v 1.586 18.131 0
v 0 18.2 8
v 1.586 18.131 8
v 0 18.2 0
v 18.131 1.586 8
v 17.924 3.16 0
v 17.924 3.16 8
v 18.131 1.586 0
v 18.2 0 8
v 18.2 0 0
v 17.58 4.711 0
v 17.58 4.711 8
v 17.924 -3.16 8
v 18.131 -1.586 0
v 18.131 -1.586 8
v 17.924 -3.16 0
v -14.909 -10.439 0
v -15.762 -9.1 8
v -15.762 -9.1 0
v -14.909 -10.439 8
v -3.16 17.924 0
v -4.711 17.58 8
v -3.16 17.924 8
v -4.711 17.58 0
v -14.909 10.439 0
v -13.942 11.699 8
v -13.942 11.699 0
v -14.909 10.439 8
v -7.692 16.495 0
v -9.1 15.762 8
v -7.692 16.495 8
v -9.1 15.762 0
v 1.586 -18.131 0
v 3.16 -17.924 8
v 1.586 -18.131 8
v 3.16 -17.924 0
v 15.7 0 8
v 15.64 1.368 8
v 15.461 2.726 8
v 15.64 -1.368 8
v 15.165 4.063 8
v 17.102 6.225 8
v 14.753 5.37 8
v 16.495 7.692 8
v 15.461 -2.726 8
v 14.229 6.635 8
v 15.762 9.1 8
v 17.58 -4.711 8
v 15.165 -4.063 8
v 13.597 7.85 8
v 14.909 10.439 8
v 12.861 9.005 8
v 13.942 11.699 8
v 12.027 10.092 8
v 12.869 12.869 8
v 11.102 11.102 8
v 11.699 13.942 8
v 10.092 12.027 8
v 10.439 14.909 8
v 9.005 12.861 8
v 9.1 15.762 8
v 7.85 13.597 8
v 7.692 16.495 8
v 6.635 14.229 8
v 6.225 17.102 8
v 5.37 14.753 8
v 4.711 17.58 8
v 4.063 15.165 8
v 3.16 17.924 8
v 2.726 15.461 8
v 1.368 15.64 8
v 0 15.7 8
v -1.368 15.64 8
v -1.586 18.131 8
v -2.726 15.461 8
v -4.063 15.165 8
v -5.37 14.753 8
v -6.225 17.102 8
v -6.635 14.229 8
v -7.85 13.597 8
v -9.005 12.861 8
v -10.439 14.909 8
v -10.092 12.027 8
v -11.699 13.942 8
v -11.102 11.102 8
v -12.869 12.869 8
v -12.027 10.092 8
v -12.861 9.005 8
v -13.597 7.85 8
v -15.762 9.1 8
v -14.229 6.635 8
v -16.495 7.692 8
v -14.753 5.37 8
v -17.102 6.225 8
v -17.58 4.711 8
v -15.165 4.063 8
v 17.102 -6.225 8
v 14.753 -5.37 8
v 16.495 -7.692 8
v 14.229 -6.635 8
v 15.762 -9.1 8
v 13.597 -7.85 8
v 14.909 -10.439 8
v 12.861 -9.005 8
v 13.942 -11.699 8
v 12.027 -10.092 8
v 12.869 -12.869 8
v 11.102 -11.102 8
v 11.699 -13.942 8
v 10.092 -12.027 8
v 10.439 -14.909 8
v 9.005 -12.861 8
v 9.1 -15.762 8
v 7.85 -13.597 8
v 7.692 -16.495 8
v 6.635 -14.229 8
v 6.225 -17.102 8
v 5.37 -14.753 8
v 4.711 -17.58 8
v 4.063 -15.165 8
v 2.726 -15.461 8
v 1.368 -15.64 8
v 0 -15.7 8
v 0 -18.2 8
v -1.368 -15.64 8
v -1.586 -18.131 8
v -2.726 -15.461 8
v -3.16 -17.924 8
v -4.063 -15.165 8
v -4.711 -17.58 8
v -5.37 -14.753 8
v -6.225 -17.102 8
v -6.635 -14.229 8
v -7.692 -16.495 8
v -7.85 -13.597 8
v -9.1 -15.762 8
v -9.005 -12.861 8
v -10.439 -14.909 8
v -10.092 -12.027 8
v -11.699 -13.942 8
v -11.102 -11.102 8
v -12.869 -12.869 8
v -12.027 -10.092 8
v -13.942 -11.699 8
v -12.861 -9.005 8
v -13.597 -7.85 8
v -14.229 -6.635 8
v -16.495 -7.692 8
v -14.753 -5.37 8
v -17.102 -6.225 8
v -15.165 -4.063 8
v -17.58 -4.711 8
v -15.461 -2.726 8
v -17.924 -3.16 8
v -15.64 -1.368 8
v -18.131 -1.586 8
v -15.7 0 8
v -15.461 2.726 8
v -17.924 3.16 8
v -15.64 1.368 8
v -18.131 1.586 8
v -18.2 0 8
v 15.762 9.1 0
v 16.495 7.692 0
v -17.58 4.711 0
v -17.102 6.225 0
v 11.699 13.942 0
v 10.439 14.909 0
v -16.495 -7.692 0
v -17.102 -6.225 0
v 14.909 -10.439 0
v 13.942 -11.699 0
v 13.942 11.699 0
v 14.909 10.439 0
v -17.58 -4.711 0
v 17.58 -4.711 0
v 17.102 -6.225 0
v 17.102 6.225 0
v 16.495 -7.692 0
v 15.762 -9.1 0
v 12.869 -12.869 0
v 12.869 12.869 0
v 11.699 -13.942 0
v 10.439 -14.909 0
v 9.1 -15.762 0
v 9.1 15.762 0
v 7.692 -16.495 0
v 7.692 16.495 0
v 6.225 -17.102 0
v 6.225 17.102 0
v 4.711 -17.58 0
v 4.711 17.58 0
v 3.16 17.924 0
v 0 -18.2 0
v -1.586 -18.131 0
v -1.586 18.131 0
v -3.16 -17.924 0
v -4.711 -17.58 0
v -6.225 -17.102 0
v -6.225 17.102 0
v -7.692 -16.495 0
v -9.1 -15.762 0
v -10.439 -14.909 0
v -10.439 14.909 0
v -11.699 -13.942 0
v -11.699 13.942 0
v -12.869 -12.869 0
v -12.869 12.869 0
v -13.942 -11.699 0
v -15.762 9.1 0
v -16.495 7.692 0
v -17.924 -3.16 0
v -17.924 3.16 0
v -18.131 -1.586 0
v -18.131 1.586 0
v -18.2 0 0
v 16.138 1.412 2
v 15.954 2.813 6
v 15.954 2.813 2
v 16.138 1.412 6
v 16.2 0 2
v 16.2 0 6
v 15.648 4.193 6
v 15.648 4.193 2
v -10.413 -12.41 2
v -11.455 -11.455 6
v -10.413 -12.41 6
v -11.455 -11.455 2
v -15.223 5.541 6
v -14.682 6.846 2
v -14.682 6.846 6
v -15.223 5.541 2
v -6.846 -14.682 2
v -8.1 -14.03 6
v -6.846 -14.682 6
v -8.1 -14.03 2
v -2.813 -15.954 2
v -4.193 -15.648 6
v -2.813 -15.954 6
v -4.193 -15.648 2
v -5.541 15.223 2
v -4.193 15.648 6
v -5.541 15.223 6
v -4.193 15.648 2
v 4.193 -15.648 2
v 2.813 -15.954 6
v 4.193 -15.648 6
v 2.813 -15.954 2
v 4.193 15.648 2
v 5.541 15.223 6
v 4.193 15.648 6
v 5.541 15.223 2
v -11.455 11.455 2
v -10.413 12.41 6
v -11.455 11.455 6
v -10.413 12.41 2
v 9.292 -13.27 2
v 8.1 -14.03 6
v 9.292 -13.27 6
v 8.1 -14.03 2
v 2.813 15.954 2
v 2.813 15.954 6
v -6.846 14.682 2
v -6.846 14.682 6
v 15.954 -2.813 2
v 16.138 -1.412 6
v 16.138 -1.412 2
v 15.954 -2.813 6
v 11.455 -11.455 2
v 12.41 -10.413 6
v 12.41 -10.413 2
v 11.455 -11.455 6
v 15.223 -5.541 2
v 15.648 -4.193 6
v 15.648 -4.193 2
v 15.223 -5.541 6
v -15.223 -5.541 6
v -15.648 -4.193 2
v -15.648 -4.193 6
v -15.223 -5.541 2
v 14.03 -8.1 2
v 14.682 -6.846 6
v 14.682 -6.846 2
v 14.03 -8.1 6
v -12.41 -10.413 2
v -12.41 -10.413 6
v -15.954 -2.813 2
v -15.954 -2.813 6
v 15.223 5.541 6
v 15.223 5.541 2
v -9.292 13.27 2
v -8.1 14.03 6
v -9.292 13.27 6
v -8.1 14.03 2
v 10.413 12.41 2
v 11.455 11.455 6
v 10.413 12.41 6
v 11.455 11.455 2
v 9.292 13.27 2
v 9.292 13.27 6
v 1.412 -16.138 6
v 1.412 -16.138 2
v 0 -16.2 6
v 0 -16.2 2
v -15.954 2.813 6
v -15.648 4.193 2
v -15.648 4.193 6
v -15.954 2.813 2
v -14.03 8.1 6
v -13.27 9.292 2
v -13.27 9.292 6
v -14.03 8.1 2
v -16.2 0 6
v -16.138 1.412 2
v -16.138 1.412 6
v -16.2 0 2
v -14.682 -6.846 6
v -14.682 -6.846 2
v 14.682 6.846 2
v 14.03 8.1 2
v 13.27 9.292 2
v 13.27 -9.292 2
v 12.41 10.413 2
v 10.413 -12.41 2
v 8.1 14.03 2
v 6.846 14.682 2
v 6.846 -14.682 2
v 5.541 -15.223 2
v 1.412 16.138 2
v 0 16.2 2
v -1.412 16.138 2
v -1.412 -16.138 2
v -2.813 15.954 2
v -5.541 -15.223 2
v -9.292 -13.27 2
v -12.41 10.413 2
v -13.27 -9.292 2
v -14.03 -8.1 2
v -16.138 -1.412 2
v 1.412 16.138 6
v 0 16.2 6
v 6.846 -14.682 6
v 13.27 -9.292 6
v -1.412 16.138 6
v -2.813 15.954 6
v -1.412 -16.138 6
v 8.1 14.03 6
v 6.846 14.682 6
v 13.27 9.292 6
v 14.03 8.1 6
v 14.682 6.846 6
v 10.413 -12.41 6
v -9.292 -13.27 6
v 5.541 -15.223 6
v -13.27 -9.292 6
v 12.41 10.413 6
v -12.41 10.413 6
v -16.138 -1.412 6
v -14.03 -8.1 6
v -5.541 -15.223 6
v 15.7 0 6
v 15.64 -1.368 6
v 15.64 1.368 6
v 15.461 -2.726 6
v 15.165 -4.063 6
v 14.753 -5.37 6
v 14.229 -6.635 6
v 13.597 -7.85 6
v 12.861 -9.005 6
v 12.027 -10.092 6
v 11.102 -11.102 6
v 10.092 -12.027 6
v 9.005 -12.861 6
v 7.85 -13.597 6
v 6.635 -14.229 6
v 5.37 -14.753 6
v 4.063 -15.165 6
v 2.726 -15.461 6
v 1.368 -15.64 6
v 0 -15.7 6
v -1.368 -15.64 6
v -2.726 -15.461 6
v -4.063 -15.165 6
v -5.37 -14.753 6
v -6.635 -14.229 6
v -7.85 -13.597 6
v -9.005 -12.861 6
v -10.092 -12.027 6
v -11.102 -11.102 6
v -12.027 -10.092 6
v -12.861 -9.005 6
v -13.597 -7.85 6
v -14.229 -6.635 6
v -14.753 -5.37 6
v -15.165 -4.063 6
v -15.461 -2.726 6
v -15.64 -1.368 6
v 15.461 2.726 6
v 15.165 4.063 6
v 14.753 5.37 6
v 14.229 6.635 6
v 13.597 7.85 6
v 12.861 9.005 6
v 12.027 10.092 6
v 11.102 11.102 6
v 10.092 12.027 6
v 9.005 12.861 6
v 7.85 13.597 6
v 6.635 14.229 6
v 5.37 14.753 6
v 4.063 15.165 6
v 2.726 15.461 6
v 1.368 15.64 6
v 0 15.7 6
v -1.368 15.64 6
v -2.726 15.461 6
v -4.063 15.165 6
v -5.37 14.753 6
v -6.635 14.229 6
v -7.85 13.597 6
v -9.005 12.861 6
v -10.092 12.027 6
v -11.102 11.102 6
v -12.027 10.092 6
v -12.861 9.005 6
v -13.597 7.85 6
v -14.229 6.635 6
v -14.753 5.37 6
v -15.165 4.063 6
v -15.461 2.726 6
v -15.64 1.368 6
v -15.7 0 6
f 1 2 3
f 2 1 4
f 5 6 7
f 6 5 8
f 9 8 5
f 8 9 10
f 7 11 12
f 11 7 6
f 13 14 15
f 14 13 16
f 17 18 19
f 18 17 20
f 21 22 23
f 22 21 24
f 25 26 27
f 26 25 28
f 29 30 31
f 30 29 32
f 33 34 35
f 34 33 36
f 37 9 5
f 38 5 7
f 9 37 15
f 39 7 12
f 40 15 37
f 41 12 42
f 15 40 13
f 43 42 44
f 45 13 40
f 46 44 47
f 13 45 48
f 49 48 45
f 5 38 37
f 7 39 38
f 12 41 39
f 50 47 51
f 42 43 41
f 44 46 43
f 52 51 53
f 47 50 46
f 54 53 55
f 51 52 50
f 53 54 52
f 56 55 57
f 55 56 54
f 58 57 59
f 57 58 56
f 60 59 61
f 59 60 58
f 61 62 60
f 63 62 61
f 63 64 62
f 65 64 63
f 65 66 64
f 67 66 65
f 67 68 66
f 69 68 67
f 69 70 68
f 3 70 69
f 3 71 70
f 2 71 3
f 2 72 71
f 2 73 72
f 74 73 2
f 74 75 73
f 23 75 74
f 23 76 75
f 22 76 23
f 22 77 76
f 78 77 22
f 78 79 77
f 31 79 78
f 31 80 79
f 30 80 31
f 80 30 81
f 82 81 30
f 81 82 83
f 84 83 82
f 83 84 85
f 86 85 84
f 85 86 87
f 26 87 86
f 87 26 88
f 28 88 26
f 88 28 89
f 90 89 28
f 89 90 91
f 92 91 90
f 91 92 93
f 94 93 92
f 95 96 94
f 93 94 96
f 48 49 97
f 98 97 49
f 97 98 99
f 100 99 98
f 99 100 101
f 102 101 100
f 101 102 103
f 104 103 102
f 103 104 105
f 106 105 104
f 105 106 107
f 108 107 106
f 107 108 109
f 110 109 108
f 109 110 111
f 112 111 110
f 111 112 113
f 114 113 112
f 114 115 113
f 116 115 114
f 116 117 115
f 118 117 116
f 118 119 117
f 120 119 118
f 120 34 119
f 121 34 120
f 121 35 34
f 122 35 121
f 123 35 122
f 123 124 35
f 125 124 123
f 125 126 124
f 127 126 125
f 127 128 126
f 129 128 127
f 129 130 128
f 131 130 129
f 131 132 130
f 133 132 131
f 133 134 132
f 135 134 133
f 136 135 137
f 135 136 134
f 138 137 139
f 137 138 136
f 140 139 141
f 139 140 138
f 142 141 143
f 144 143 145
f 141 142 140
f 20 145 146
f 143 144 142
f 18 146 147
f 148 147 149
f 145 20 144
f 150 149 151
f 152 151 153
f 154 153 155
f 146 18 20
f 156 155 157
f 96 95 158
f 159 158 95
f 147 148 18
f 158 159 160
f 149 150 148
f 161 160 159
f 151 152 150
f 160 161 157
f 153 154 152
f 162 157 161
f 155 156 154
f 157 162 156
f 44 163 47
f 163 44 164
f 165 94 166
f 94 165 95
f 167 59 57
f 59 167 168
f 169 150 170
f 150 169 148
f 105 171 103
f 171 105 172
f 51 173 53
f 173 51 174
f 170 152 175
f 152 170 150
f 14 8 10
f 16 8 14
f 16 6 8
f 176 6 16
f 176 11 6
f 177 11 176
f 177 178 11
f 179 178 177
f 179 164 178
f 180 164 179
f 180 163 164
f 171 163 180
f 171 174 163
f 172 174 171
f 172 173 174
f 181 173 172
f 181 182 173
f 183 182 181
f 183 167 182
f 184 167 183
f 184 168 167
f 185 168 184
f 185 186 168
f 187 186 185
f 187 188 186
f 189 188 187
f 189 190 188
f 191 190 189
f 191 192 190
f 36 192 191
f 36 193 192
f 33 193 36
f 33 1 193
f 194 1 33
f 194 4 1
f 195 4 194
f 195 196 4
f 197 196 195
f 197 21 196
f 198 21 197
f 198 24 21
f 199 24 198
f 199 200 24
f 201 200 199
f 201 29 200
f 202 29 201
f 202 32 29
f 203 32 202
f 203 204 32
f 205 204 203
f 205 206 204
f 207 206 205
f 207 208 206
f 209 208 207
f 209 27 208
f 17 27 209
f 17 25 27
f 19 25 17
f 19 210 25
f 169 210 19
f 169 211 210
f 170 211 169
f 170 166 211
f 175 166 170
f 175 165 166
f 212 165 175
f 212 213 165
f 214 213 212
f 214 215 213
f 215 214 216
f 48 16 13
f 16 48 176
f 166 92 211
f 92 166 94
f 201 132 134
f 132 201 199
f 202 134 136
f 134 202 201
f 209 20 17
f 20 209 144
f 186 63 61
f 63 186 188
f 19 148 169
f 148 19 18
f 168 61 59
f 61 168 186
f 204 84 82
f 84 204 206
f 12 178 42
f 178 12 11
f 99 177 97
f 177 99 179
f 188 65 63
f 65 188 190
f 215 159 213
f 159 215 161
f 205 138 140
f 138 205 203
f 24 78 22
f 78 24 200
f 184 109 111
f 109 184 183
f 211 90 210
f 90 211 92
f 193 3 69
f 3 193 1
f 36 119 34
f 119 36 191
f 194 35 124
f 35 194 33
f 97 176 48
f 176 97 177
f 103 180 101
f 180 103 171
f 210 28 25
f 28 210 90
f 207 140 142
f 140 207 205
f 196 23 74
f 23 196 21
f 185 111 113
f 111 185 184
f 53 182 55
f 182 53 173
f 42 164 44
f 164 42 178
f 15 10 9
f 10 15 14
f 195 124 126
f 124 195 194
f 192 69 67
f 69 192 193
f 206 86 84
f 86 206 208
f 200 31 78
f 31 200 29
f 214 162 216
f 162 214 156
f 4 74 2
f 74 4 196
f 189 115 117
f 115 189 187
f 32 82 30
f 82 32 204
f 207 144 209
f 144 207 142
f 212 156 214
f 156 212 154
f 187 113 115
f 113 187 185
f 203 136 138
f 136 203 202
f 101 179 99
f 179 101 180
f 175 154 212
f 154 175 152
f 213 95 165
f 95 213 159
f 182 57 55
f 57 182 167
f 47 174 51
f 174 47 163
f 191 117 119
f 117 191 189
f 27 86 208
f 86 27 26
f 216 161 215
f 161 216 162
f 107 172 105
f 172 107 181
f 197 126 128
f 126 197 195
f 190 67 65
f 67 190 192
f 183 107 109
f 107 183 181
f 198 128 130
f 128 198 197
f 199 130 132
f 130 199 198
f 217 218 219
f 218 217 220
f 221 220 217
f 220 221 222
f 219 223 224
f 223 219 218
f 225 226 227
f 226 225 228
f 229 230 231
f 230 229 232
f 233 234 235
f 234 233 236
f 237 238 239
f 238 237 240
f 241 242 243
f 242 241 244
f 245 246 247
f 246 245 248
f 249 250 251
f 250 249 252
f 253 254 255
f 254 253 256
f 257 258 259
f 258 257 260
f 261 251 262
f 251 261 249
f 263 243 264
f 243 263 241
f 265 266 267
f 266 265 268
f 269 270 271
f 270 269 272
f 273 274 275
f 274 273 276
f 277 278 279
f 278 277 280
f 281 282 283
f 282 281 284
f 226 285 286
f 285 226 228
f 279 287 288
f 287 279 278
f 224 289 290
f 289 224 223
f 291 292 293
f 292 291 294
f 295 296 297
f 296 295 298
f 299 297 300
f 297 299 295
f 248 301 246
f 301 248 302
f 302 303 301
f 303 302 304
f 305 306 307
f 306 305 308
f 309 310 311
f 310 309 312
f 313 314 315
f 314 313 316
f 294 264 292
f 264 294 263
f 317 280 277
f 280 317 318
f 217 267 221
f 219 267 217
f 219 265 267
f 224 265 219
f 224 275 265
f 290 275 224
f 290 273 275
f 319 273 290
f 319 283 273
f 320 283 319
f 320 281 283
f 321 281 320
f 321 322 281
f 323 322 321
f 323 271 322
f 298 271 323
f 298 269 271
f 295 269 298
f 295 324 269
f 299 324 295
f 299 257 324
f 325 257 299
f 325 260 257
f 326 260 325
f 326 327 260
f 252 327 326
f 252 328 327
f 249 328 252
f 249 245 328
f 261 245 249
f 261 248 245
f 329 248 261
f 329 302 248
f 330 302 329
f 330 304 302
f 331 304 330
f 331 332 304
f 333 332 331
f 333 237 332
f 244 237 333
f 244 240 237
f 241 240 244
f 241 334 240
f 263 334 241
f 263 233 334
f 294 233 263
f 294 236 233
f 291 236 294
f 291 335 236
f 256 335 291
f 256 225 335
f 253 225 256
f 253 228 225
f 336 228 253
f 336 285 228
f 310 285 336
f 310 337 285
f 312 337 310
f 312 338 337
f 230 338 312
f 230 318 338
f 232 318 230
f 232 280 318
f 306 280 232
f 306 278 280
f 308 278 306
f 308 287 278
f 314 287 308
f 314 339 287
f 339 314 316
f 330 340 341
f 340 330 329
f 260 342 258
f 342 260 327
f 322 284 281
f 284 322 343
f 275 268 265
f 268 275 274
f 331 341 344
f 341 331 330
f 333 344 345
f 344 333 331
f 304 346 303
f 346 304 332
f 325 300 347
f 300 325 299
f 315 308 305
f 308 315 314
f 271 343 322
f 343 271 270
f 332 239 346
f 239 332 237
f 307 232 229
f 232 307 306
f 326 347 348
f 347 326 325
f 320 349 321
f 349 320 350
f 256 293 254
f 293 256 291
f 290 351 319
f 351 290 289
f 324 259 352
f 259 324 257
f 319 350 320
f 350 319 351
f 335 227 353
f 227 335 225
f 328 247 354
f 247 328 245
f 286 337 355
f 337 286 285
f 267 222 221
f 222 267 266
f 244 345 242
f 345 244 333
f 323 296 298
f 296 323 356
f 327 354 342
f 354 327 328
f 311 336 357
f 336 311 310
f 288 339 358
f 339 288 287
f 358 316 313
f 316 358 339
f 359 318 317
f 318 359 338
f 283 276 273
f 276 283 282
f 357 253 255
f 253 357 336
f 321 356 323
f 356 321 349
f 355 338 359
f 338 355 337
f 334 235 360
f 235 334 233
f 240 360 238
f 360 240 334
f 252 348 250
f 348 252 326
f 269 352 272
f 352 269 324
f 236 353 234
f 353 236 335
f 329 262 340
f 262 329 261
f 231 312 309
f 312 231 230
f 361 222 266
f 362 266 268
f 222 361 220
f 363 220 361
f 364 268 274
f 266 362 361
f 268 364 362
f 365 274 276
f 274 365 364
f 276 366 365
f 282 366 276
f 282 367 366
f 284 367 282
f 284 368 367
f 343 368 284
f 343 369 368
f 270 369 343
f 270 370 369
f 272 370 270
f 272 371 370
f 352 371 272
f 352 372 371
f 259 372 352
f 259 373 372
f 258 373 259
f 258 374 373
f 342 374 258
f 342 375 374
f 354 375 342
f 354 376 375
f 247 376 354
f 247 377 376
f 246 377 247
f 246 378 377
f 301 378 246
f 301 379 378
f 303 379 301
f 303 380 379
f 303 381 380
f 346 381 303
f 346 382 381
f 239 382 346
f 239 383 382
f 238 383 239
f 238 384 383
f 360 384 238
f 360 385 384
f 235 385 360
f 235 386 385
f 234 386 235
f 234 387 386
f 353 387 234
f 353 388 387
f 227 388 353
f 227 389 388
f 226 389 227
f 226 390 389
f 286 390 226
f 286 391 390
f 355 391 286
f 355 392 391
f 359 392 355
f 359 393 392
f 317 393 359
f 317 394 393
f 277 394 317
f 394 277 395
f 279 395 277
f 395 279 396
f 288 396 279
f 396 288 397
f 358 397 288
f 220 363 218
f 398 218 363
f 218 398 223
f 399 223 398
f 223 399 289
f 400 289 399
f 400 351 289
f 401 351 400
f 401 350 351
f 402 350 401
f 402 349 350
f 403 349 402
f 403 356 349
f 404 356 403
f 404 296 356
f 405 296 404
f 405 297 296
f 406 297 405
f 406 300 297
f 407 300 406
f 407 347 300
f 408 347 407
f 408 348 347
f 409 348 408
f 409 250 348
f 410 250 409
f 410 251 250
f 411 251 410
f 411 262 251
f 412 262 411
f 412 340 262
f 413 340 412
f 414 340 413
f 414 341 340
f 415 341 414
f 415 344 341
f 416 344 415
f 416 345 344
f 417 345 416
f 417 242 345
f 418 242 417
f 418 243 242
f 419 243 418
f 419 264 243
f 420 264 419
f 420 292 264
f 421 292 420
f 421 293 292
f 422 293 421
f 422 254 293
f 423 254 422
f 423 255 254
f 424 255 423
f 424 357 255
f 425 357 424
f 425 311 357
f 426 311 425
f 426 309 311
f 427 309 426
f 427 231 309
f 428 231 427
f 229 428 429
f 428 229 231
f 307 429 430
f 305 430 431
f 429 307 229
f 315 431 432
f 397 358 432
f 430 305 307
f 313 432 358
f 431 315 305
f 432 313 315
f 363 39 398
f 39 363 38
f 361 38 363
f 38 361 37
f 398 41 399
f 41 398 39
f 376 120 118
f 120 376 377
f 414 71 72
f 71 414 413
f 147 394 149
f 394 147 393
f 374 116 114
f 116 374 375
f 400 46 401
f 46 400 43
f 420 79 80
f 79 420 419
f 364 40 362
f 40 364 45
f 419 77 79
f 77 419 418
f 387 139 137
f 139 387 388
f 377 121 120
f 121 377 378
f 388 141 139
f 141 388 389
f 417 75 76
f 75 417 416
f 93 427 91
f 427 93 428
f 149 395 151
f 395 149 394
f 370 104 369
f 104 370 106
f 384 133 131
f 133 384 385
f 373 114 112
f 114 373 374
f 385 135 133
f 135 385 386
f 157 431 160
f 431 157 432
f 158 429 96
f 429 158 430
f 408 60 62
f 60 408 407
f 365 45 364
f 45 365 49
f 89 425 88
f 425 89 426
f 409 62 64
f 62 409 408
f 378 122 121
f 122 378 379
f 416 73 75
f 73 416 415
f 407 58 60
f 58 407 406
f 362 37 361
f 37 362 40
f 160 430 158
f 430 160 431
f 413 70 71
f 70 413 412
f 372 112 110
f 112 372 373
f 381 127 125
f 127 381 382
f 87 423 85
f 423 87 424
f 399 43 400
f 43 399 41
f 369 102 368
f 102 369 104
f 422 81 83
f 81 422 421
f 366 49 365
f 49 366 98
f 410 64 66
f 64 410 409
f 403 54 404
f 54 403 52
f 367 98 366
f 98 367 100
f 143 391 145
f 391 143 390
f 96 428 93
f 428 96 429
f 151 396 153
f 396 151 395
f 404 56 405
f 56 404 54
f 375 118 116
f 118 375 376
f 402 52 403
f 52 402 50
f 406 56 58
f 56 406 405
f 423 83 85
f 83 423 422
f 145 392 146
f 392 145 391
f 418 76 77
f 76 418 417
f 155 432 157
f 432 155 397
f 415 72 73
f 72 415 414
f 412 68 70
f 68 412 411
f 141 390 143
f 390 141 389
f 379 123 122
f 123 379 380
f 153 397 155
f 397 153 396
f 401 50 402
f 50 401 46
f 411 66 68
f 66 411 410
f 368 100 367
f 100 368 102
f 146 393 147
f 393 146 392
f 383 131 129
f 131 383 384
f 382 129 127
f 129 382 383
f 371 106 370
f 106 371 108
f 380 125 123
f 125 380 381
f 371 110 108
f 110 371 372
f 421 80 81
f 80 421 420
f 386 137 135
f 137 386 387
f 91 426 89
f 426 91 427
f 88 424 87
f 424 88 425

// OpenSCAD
/* Faucet Vacuum Breaker Valve Cap */


$fa = 5;
$fs = 1;


DIA = 32.4;
HEIGHT = 6;
THICKNESS = 2;


module semihollow_cylinder(inner_h, inner_d, thickness) {
    h = inner_h + thickness;
    d = inner_d + 2 * thickness;
    difference() {
        cylinder(h=h, d=d);
        translate([0, 0, thickness])  cylinder(h=inner_h, d=inner_d);
    }
}

module hollow_cylinder(inner_h, inner_d, thickness) {
    h = inner_h;
    d = inner_d + 2 * thickness;
    difference() {
        cylinder(h=h, d=d);
        cylinder(h=inner_h, d=inner_d);
    }
}

union() {
    semihollow_cylinder(inner_h=HEIGHT, inner_d=DIA, thickness=THICKNESS);
    translate([0, 0, HEIGHT]) hollow_cylinder(inner_h=2, inner_d=DIA-1, thickness=THICKNESS+0.5);
}
